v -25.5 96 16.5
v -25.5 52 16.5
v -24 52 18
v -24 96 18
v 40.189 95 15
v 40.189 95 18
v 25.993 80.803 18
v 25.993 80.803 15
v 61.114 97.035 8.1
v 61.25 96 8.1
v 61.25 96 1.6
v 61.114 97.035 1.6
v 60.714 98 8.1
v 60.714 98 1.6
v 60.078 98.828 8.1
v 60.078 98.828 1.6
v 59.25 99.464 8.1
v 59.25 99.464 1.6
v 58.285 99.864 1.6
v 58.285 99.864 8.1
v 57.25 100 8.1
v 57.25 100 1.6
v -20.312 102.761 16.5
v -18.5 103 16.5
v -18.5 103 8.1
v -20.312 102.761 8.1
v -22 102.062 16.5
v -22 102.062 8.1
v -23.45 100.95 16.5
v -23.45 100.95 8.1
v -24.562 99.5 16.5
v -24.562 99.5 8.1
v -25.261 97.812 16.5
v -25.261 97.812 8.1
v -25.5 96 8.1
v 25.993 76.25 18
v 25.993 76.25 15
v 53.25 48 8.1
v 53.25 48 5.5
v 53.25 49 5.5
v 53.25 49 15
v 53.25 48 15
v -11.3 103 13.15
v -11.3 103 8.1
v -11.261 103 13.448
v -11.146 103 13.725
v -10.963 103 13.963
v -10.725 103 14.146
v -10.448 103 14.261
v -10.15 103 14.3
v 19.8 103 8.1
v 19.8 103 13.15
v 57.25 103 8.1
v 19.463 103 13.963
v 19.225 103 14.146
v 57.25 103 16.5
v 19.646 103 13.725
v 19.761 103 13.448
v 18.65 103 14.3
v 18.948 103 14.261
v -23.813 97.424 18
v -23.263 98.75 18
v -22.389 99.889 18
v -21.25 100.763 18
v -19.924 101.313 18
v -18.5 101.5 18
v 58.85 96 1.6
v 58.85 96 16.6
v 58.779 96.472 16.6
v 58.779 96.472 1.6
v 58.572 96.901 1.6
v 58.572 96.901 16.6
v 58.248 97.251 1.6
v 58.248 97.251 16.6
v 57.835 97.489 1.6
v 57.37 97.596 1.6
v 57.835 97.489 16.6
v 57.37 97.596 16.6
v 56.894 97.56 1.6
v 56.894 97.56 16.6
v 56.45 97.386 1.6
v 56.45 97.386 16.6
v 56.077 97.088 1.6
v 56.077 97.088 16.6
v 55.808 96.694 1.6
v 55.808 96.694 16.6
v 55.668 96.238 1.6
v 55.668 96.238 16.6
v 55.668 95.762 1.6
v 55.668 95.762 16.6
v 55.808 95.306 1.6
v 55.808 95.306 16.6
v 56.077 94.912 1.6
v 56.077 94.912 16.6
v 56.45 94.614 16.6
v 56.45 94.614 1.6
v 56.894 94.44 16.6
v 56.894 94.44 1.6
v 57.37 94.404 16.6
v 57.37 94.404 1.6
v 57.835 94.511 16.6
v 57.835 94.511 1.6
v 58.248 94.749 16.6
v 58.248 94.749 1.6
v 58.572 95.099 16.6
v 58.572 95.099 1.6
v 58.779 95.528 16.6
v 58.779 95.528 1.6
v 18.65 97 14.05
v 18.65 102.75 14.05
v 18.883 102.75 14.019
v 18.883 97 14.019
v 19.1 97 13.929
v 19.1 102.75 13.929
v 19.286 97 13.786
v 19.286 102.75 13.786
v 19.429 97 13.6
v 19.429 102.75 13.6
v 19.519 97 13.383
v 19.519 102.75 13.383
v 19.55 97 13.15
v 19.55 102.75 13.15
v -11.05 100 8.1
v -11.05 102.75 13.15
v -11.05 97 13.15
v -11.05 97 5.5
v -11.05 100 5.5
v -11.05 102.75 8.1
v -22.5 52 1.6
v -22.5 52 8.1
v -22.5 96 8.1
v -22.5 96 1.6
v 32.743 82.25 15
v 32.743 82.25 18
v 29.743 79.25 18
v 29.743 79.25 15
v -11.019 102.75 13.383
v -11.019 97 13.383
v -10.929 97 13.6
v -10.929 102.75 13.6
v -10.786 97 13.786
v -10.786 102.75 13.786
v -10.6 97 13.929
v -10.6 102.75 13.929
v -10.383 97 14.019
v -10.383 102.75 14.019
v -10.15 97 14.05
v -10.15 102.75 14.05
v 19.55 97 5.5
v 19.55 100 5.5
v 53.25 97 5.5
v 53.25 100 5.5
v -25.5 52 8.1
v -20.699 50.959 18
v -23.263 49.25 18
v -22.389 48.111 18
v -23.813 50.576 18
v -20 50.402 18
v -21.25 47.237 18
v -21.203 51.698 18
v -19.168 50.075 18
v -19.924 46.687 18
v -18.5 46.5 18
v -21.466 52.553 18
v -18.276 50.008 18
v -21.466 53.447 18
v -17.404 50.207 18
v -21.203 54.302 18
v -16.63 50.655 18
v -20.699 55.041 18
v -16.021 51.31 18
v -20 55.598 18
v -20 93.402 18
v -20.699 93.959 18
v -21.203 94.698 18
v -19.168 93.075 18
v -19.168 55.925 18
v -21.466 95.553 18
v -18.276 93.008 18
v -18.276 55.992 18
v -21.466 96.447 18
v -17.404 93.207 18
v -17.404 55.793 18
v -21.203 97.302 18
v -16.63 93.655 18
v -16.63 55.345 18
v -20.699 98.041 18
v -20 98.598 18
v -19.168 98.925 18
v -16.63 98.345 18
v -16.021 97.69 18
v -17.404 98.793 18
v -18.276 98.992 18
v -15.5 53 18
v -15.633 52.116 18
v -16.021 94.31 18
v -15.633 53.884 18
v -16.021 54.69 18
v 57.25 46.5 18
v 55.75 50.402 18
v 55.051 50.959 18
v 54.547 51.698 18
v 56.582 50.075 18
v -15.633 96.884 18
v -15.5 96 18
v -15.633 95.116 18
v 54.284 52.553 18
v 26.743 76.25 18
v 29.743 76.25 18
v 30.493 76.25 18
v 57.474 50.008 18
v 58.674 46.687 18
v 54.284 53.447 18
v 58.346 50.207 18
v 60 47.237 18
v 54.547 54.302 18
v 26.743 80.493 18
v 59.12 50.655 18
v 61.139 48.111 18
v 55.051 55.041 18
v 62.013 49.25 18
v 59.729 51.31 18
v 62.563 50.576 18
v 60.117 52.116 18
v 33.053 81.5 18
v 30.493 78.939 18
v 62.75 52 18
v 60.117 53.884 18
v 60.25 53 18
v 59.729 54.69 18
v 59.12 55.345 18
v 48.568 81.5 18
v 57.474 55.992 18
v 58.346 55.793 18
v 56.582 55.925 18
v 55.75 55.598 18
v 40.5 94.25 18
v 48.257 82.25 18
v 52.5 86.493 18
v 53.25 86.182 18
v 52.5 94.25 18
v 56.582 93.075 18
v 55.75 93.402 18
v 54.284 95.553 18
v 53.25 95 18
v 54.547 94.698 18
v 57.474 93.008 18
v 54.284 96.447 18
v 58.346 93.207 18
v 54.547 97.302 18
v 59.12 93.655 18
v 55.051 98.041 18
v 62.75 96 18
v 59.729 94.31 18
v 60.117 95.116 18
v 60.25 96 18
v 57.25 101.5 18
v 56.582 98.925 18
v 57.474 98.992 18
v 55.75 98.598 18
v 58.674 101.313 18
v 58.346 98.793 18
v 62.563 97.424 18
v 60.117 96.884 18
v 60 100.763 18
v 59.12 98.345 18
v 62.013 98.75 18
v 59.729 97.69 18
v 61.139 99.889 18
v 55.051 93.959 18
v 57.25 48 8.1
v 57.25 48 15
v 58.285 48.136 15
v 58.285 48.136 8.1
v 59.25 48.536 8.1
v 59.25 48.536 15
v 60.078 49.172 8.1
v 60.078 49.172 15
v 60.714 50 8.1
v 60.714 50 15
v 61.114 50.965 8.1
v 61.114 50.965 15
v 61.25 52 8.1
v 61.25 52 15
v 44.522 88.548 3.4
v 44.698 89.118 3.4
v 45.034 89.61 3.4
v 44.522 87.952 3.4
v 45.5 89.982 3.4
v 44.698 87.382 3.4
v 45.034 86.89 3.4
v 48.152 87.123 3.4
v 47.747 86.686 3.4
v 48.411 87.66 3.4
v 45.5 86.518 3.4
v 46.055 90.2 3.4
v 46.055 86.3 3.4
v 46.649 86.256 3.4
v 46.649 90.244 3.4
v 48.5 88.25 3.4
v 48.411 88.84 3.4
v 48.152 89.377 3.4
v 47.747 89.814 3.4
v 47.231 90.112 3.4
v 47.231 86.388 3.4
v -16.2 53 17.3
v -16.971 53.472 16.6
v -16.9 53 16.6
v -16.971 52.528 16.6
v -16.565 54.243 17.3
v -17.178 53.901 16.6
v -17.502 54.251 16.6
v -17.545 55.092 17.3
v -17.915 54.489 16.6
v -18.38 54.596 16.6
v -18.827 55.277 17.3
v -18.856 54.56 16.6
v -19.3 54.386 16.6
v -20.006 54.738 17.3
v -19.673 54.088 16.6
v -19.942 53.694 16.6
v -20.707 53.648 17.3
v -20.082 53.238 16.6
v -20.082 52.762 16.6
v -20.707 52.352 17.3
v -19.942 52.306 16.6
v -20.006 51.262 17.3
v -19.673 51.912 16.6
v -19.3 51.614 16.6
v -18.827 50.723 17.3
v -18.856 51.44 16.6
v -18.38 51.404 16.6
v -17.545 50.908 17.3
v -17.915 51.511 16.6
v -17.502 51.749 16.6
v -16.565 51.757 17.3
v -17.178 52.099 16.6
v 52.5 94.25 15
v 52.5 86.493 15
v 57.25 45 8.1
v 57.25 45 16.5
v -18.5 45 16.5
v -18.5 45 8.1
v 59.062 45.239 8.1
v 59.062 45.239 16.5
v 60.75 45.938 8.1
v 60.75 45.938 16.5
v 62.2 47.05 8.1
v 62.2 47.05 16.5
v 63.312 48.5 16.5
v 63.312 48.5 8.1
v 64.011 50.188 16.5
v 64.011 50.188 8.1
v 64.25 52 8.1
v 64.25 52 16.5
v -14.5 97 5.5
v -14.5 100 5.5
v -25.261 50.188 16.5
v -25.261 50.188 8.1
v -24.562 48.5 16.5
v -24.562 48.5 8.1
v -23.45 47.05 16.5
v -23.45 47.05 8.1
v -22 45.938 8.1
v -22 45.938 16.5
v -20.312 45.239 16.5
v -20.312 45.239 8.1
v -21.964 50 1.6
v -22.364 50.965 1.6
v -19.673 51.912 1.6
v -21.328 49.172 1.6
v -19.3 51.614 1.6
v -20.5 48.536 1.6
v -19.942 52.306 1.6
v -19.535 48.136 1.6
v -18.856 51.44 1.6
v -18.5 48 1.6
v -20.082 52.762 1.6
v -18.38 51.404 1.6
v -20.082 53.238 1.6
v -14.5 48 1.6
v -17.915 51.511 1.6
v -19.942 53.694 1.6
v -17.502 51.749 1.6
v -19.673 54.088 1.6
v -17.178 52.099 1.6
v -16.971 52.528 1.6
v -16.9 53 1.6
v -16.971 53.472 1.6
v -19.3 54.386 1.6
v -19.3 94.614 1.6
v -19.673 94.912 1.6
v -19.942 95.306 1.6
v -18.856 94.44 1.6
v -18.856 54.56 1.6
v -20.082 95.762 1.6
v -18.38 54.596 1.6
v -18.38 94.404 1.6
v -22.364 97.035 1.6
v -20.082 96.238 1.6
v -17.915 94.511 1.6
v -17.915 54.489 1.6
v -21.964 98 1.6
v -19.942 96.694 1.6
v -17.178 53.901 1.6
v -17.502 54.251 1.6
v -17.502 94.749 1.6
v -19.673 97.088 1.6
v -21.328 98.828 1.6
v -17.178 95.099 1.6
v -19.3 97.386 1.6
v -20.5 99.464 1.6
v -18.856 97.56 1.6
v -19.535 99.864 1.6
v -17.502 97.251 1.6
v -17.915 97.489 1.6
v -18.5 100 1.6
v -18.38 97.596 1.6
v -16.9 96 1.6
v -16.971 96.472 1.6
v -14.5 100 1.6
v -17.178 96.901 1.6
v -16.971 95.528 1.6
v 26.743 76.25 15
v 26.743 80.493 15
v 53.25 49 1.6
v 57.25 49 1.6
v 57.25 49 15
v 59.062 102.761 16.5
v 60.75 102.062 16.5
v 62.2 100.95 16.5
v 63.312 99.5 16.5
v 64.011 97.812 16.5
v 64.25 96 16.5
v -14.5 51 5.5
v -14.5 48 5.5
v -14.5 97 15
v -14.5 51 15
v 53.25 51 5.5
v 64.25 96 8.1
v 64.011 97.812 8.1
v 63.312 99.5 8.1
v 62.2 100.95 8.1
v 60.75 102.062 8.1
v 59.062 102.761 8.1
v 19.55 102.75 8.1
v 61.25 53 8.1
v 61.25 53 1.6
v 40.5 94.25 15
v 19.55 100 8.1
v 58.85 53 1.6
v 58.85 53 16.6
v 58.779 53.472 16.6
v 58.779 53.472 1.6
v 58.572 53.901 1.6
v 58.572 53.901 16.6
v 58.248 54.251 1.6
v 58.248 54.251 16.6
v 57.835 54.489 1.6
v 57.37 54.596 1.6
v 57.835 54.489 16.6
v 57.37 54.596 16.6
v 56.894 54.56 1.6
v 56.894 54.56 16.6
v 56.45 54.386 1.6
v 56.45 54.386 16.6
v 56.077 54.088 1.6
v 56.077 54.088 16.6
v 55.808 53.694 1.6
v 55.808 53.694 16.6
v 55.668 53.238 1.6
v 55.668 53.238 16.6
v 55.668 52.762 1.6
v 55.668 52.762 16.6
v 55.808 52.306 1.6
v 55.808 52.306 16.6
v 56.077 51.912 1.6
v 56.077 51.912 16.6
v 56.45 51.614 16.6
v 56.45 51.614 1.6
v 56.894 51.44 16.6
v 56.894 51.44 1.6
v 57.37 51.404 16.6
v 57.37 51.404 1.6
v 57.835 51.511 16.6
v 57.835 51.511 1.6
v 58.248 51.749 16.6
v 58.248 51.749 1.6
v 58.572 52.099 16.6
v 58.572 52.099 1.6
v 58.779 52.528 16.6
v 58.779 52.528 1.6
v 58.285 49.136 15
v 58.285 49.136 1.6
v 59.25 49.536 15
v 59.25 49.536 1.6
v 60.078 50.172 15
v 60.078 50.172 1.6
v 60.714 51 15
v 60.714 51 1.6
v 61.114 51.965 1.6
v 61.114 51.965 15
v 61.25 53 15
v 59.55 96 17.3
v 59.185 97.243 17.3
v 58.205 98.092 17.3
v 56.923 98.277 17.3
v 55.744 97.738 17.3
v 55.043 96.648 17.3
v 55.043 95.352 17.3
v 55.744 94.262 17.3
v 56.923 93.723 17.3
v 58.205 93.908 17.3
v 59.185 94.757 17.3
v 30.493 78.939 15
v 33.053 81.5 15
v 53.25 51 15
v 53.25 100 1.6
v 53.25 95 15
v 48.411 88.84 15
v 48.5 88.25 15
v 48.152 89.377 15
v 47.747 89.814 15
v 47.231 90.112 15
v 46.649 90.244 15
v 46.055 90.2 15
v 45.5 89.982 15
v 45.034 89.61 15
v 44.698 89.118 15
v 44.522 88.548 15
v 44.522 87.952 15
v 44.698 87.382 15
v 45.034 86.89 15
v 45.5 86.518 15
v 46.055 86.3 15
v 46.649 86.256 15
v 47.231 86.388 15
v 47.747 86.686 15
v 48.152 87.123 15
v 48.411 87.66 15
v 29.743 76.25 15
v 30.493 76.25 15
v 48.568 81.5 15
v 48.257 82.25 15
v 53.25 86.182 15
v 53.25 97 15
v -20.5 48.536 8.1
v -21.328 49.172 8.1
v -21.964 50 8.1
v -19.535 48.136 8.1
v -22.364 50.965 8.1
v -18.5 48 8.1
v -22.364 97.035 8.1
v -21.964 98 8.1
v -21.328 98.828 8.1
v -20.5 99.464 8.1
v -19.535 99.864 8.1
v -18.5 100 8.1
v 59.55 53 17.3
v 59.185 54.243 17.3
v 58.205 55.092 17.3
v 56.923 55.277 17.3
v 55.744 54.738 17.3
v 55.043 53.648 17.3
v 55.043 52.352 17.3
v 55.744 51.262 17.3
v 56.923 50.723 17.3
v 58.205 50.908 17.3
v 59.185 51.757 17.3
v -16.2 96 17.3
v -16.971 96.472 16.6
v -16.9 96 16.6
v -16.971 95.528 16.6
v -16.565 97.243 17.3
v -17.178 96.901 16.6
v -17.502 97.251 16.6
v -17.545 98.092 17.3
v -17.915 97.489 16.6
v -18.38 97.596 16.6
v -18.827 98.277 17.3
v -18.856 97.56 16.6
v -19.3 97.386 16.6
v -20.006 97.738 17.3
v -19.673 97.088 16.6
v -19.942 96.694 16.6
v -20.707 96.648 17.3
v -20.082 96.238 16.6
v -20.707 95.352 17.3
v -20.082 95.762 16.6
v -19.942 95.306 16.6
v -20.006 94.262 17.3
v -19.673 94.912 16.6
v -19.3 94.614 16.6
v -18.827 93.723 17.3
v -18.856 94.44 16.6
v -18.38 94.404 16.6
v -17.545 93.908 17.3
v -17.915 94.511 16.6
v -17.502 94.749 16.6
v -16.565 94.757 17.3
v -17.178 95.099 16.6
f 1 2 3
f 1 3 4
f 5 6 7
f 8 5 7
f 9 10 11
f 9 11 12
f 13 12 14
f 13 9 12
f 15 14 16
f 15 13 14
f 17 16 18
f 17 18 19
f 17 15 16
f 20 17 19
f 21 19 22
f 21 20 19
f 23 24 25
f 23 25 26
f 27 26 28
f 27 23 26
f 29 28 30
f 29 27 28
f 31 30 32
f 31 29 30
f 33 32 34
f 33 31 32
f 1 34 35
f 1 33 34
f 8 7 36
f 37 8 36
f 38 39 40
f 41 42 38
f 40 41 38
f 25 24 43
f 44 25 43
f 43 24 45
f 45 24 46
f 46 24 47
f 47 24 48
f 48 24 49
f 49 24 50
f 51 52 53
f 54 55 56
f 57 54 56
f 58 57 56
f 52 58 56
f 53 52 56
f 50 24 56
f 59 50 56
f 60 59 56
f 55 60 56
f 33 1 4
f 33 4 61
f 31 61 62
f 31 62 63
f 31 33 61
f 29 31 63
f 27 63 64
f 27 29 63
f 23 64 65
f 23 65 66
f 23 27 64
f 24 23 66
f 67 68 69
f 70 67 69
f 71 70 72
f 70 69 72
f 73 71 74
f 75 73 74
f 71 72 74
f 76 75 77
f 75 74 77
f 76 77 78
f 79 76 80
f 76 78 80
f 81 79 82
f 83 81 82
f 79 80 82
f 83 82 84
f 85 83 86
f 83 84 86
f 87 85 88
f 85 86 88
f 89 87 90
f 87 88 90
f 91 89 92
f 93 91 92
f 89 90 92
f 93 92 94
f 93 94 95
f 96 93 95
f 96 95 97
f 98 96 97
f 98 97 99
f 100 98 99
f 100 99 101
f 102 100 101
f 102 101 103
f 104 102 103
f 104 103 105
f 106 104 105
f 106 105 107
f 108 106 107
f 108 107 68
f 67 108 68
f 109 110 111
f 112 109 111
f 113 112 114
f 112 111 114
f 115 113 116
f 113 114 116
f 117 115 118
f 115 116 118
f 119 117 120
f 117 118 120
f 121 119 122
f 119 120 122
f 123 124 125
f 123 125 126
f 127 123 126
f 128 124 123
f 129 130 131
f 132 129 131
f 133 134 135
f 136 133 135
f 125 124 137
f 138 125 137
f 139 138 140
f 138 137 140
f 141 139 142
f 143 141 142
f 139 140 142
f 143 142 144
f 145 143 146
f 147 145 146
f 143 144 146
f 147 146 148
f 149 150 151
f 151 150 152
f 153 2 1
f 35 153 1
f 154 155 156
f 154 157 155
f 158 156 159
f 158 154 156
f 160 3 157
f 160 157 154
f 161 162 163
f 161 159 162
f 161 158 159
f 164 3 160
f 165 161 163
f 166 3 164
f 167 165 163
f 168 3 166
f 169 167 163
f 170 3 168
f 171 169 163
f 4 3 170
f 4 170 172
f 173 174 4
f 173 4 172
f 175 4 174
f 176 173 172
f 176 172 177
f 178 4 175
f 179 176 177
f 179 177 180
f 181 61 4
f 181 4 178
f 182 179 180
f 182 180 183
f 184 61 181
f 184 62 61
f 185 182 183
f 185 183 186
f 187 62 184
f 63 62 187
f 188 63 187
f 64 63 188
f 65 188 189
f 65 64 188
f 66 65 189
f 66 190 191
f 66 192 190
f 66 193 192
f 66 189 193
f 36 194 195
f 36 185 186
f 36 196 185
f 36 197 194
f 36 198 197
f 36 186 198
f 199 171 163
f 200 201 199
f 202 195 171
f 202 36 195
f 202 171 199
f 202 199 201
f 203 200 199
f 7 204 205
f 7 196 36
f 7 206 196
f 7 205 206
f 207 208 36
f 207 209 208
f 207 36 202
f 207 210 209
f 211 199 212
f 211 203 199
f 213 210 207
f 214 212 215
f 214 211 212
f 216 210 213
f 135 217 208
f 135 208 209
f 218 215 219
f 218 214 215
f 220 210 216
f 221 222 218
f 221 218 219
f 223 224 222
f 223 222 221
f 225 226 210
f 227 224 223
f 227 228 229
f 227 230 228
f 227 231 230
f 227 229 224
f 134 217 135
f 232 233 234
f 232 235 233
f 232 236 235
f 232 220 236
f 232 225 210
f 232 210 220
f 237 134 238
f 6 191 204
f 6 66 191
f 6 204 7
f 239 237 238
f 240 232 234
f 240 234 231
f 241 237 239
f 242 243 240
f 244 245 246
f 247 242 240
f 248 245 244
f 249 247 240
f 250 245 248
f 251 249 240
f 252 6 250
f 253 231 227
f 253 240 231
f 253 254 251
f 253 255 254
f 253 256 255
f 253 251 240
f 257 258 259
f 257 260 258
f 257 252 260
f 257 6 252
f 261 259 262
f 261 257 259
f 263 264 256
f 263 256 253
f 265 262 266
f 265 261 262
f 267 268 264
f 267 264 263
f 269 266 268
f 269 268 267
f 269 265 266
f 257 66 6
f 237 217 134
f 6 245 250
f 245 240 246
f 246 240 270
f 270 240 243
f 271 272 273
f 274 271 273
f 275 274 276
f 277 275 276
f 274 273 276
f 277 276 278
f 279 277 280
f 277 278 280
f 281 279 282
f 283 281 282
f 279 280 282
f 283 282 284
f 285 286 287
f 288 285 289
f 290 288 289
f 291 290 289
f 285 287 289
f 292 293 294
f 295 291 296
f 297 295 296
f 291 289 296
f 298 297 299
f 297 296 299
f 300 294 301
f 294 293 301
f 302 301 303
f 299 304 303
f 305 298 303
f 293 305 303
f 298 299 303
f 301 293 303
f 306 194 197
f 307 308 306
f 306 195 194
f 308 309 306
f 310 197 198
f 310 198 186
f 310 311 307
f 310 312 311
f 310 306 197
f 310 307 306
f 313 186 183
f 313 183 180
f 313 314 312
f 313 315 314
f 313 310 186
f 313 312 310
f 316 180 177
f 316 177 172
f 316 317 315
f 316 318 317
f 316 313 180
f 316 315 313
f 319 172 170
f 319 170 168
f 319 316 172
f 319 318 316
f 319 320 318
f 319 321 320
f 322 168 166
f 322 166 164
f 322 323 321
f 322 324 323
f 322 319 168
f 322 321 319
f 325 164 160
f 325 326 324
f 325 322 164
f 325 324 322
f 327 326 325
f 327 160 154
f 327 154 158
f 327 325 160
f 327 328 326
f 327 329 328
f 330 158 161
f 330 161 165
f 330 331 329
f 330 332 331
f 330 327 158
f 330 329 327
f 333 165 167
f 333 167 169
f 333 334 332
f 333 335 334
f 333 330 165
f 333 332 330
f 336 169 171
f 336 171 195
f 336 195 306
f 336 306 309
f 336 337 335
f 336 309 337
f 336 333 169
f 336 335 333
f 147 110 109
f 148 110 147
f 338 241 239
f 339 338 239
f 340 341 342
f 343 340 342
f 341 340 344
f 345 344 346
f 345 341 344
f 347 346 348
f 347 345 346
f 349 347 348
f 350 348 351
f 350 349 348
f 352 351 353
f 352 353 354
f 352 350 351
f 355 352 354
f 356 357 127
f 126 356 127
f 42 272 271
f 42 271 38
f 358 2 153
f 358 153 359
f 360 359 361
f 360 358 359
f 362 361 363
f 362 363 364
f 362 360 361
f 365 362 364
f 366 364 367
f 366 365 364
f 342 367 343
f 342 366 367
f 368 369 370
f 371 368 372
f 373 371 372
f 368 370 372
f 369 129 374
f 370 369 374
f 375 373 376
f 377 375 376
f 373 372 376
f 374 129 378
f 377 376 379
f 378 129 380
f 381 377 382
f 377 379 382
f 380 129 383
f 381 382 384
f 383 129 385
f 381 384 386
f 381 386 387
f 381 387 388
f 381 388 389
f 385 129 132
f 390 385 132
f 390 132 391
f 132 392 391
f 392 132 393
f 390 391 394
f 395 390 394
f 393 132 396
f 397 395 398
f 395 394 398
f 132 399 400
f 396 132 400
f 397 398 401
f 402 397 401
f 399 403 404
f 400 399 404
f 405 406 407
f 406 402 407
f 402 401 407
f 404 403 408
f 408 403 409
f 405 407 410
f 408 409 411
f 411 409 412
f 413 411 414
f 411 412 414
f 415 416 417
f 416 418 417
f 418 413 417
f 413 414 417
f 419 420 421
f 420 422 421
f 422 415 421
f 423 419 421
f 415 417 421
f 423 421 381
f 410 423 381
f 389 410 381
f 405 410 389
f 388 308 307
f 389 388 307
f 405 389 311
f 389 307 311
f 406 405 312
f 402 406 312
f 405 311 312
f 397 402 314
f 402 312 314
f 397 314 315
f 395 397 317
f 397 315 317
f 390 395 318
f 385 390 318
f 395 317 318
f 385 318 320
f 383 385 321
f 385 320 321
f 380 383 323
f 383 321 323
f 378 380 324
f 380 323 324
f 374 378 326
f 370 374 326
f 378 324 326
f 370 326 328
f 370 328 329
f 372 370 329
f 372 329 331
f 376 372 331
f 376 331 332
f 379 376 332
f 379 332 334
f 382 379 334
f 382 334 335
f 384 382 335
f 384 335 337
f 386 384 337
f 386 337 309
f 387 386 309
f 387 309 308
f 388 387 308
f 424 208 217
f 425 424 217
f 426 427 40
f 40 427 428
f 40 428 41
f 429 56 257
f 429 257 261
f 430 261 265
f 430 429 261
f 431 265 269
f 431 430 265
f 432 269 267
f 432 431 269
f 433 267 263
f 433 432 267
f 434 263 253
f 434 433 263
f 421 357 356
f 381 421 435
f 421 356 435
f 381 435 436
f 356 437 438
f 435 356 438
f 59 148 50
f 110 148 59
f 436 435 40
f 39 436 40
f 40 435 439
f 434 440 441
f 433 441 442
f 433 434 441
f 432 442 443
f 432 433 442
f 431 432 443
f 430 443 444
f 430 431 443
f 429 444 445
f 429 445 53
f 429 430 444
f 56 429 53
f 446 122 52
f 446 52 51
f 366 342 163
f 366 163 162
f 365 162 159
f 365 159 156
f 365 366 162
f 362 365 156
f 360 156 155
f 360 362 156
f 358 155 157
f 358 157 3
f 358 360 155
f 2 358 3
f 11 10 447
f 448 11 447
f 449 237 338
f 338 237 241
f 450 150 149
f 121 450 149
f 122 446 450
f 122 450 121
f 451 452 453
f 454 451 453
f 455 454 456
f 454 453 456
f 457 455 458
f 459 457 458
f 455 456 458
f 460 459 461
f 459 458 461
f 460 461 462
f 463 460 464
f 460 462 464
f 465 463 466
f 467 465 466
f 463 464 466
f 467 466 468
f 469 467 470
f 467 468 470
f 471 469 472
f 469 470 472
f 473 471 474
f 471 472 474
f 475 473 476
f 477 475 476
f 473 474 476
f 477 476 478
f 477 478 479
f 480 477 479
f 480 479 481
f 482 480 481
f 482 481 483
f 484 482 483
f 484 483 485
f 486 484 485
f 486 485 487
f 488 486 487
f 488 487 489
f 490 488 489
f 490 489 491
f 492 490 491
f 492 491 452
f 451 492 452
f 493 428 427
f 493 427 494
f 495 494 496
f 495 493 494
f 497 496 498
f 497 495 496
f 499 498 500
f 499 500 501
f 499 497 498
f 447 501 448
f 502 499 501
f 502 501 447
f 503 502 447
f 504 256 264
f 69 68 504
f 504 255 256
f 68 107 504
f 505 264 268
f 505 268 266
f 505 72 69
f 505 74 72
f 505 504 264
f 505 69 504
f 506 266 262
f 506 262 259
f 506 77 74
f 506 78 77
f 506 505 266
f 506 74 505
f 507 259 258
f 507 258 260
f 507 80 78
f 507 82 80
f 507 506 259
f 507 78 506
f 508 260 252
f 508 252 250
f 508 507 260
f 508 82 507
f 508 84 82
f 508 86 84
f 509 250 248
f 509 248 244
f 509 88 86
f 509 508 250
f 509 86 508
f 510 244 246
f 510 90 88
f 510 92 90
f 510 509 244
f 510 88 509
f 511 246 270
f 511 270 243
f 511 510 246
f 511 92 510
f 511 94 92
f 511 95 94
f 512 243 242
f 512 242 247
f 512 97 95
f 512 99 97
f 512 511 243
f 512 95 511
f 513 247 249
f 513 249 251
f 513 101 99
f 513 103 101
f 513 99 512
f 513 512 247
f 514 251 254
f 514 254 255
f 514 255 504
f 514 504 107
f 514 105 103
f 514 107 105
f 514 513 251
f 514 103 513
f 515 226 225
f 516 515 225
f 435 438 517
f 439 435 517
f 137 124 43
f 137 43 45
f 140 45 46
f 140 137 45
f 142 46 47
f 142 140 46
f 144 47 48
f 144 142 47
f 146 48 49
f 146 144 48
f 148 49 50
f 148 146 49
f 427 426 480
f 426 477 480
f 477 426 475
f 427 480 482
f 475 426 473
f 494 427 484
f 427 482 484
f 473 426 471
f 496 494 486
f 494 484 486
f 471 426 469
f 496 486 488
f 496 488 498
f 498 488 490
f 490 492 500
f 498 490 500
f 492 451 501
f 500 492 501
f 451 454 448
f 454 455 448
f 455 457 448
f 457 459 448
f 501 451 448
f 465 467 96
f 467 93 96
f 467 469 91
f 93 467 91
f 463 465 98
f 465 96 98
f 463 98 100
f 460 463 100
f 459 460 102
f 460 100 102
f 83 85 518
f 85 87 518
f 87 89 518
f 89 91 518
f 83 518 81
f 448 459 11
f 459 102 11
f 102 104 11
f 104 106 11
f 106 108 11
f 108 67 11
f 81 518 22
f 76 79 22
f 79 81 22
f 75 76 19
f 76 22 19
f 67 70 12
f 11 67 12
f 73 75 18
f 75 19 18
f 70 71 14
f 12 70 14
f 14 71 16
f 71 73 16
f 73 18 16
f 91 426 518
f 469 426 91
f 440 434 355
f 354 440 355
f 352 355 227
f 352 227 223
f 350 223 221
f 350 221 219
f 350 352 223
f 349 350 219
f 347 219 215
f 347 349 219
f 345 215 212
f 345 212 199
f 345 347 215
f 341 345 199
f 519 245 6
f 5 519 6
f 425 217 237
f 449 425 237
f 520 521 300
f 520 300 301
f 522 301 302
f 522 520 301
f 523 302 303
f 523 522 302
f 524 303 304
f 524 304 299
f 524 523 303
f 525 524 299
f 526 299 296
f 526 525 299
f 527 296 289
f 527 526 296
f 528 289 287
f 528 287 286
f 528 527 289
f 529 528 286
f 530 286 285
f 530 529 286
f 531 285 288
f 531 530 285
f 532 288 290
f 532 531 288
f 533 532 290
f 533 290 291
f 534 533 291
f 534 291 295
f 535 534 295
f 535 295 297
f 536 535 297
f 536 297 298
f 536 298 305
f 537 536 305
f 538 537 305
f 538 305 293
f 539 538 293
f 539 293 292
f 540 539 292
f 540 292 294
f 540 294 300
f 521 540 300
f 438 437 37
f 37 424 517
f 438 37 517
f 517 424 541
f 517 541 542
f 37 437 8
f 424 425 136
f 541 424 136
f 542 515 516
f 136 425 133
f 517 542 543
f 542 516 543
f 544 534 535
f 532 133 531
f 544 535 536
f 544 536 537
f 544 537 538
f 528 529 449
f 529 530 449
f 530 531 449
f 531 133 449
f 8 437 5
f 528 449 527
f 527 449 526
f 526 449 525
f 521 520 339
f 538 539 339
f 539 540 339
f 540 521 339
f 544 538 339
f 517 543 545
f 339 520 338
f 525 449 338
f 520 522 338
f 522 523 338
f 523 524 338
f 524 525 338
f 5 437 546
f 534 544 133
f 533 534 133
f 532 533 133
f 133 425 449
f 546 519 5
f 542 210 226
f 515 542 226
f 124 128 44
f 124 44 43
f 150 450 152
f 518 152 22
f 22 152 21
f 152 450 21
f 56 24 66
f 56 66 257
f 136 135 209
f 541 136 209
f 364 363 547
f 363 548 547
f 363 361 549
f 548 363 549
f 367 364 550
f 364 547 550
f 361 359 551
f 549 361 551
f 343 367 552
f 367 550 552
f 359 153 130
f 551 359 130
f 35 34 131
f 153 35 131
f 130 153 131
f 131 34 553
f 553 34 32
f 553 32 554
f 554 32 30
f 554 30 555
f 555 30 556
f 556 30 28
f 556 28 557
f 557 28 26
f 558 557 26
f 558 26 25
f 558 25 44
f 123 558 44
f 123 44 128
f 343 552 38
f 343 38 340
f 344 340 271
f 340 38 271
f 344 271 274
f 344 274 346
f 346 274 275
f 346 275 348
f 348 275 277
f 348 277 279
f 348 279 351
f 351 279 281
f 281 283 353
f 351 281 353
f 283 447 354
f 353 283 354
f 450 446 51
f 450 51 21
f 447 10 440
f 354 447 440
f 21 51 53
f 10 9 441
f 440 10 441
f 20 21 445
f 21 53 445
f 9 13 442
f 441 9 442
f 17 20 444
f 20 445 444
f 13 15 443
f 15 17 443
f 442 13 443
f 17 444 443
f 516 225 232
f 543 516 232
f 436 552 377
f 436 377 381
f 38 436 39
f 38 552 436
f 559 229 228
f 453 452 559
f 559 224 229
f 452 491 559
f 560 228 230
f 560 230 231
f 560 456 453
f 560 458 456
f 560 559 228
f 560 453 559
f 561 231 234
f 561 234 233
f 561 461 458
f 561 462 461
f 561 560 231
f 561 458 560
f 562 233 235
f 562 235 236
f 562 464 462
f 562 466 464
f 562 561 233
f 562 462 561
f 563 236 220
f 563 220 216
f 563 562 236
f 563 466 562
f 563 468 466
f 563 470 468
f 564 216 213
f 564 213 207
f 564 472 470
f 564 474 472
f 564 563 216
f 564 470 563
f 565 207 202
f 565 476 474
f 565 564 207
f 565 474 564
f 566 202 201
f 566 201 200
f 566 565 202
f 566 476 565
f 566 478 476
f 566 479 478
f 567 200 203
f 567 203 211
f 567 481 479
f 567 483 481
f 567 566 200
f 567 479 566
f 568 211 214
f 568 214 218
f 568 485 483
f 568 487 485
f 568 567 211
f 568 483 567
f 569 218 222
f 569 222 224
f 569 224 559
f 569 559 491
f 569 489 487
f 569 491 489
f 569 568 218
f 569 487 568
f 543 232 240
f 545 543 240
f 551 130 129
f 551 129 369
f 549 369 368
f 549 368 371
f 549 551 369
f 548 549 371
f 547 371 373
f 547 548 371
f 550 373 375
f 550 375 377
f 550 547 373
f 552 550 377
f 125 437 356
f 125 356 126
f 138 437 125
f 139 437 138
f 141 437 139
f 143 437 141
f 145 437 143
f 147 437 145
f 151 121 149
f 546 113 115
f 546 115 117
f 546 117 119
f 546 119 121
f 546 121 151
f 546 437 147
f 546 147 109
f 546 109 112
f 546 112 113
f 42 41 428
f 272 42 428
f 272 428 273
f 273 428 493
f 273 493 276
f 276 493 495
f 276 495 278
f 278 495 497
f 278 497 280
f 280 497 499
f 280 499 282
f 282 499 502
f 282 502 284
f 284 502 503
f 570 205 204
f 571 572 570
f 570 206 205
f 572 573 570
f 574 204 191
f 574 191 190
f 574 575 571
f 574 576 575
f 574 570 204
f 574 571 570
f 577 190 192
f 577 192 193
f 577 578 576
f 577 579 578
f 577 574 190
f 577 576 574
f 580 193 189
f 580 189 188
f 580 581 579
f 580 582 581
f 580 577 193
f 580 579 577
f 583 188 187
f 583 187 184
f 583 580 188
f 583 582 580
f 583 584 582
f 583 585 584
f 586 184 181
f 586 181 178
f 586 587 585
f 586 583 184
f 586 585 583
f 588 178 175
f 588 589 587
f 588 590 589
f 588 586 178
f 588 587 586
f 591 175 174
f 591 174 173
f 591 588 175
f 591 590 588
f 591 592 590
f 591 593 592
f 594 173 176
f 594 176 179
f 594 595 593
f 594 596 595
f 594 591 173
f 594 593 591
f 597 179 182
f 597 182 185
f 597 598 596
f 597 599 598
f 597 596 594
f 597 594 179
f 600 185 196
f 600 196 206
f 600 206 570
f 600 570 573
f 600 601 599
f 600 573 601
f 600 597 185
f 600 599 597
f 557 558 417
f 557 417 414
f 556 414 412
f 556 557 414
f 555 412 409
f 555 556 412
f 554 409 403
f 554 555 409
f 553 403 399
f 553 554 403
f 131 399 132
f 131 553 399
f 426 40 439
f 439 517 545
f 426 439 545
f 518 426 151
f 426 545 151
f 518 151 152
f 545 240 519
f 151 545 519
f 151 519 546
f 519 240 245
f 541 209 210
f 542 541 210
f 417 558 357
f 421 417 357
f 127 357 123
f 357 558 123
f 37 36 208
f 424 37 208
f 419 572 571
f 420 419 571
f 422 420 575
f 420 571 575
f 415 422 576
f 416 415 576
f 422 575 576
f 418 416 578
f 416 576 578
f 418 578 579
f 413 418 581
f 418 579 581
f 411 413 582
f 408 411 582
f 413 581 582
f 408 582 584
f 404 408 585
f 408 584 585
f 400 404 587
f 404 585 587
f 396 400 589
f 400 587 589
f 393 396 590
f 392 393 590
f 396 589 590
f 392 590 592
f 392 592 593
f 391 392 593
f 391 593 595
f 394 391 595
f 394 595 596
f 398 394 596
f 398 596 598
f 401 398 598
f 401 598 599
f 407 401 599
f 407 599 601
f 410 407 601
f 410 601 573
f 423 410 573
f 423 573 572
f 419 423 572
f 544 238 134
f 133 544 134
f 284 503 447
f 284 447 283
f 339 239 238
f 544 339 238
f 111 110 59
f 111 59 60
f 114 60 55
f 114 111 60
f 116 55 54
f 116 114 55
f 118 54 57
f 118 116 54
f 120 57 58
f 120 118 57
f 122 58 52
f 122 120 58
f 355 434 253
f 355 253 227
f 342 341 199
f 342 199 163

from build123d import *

# Parameters (mm, degrees)
PAD002_DEPTH    = 9.9
POCKET004_DEPTH = 10
PAD003_DEPTH    = 16.4
SKETCH011_W     = 67.75
SKETCH011_H     = 3
PAD004_DEPTH    = 12.5
POCKET005_DEPTH = 13
SKETCH010_R     = 1.6
POCKET006_DEPTH = 19.401
SKETCH012_R     = 2
PAD005_DEPTH    = 14.6
POCKET007_DEPTH = 3
CHAMFER_SIZE    = 1.5
CHAMFER002_SIZE = 1.4
CHAMFER004_SIZE = 0.25


with BuildPart() as part:
    # Sketch006 → Pad002 (new body)
    with BuildSketch(Plane.XY.offset(18)):
        with BuildLine():
            ThreePointArc((-18.5, 103), (-23.449747, 100.949747), (-25.5, 96))
            Line((-25.5, 52), (-25.5, 96))
            ThreePointArc((-25.5, 52), (-23.449747, 47.050253), (-18.5, 45))
            Line((57.25, 45), (-18.5, 45))
            ThreePointArc((57.25, 45), (62.199747, 47.050253), (64.25, 52))
            Line((64.25, 96), (64.25, 52))
            ThreePointArc((64.25, 96), (62.199747, 100.949747), (57.25, 103))
            Line((-18.5, 103), (57.25, 103))
        make_face()
    extrude(amount=-PAD002_DEPTH)

    # Sketch007 → Pocket004 (cut)
    with BuildSketch(Plane.XY.offset(15)):
        with BuildLine():
            ThreePointArc((-18.5, 100), (-21.328427, 98.828427), (-22.5, 96))
            Line((-22.5, 52), (-22.5, 96))
            ThreePointArc((-22.5, 52), (-21.328427, 49.171573), (-18.5, 48))
            Line((57.25, 48), (-18.5, 48))
            ThreePointArc((57.25, 48), (60.078427, 49.171573), (61.25, 52))
            Line((61.25, 96), (61.25, 52))
            ThreePointArc((61.25, 96), (60.078427, 98.828427), (57.25, 100))
            Line((-18.5, 100), (57.25, 100))
        make_face()
    extrude(amount=-POCKET004_DEPTH, mode=Mode.SUBTRACT)

    # Sketch008 → Pad003 (join)
    with BuildSketch(Plane.XY.offset(18)):
        with BuildLine():
            ThreePointArc((-22.5, 52), (-21.328427, 49.171573), (-18.5, 48))
            Line((-14.5, 48), (-18.5, 48))
            Line((-14.5, 100), (-14.5, 48))
            Line((-18.5, 100), (-14.5, 100))
            ThreePointArc((-18.5, 100), (-21.328427, 98.828427), (-22.5, 96))
            Line((-22.5, 52), (-22.5, 96))
        make_face()
        with BuildLine():
            ThreePointArc((61.25, 96), (60.078427, 98.828427), (57.25, 100))
            Line((53.25, 100), (57.25, 100))
            Line((53.25, 49), (53.25, 100))
            Line((57.25, 49), (53.25, 49))
            ThreePointArc((57.25, 49), (60.078427, 50.171573), (61.25, 53))
            Line((61.25, 96), (61.25, 53))
        make_face()
    extrude(amount=-PAD003_DEPTH)

    # Sketch011 → Pad004 (join)
    with BuildSketch(Plane.XY.offset(18)):
        with Locations((19.375, 98.5)):
            Rectangle(SKETCH011_W, SKETCH011_H)
        with Locations((19.375, 49.5)):
            Rectangle(SKETCH011_W, SKETCH011_H)
    extrude(amount=-PAD004_DEPTH)

    # Sketch009 → Pocket005 (cut)
    with BuildSketch(Plane(origin=(0, 108, 0), x_dir=(-1, 0, 0), z_dir=(0, 1, 0))):
        with BuildLine():
            ThreePointArc((-18.65, 14.05), (-19.286396, 13.786396), (-19.55, 13.15))
            Line((-19.55, 2.65), (-19.55, 13.15))
            ThreePointArc((-19.55, 2.65), (-19.286396, 2.013604), (-18.65, 1.75))
            Line((10.15, 1.75), (-18.65, 1.75))
            ThreePointArc((10.15, 1.75), (10.786396, 2.013604), (11.05, 2.65))
            Line((11.05, 13.15), (11.05, 2.65))
            ThreePointArc((11.05, 13.15), (10.786396, 13.786396), (10.15, 14.05))
            Line((-18.65, 14.05), (10.15, 14.05))
        make_face()
    extrude(amount=-POCKET005_DEPTH, mode=Mode.SUBTRACT)

    # Sketch010 → Pocket006 (cut, through all)
    with BuildSketch(Plane.XY.offset(21)):
        with Locations((-18.5, 96)):
            Circle(SKETCH010_R)
        with Locations((-18.5, 53)):
            Circle(SKETCH010_R)
        with Locations((57.25, 53)):
            Circle(SKETCH010_R)
        with Locations((57.25, 96)):
            Circle(SKETCH010_R)
    extrude(amount=-POCKET006_DEPTH, mode=Mode.SUBTRACT)

    # Sketch012 → Pad005 (join)
    with BuildSketch(Plane.XY.offset(18)):
        with Locations((46.5, 88.25)):
            Circle(SKETCH012_R)
    extrude(amount=-PAD005_DEPTH)

    # Sketch013 → Pocket007 (cut)
    with BuildSketch(Plane.XY.offset(18)):
        Polygon((40.5, 94.25), (52.5, 94.25), (52.5, 86.492641), (48.257359, 82.25), (40.5, 82.25), (32.742641, 82.25), (29.742641, 79.25), (29.742641, 76.25), (30.492641, 76.25), (30.492641, 78.93934), (33.053301, 81.5), (48.568019, 81.5), (53.25, 86.181981), (53.25, 95), (40.18934, 95), (25.992641, 80.803301), (25.992641, 76.25), (26.742641, 76.25), (26.742641, 80.492641), align=None)
    extrude(amount=-POCKET007_DEPTH, mode=Mode.SUBTRACT)

    # Chamfer
    chamfer_edges = [part.edges().sort_by_distance(p)[0] for p in [
        (64.25, 74, 18),
    ]]
    chamfer(chamfer_edges, length=CHAMFER_SIZE)

    # Chamfer002
    chamfer002_edges = [part.edges().sort_by_distance(p)[0] for p in [
        (55.65, 96, 18),
        (55.65, 53, 18),
        (-20.1, 53, 18),
        (-20.1, 96, 18),
    ]]
    chamfer(chamfer002_edges, length=CHAMFER002_SIZE)

    # Chamfer004
    chamfer004_edges = [part.edges().sort_by_distance(p)[0] for p in [
        (19.55, 103, 10.625),
    ]]
    chamfer(chamfer004_edges, length=CHAMFER004_SIZE)


solid = part.part
